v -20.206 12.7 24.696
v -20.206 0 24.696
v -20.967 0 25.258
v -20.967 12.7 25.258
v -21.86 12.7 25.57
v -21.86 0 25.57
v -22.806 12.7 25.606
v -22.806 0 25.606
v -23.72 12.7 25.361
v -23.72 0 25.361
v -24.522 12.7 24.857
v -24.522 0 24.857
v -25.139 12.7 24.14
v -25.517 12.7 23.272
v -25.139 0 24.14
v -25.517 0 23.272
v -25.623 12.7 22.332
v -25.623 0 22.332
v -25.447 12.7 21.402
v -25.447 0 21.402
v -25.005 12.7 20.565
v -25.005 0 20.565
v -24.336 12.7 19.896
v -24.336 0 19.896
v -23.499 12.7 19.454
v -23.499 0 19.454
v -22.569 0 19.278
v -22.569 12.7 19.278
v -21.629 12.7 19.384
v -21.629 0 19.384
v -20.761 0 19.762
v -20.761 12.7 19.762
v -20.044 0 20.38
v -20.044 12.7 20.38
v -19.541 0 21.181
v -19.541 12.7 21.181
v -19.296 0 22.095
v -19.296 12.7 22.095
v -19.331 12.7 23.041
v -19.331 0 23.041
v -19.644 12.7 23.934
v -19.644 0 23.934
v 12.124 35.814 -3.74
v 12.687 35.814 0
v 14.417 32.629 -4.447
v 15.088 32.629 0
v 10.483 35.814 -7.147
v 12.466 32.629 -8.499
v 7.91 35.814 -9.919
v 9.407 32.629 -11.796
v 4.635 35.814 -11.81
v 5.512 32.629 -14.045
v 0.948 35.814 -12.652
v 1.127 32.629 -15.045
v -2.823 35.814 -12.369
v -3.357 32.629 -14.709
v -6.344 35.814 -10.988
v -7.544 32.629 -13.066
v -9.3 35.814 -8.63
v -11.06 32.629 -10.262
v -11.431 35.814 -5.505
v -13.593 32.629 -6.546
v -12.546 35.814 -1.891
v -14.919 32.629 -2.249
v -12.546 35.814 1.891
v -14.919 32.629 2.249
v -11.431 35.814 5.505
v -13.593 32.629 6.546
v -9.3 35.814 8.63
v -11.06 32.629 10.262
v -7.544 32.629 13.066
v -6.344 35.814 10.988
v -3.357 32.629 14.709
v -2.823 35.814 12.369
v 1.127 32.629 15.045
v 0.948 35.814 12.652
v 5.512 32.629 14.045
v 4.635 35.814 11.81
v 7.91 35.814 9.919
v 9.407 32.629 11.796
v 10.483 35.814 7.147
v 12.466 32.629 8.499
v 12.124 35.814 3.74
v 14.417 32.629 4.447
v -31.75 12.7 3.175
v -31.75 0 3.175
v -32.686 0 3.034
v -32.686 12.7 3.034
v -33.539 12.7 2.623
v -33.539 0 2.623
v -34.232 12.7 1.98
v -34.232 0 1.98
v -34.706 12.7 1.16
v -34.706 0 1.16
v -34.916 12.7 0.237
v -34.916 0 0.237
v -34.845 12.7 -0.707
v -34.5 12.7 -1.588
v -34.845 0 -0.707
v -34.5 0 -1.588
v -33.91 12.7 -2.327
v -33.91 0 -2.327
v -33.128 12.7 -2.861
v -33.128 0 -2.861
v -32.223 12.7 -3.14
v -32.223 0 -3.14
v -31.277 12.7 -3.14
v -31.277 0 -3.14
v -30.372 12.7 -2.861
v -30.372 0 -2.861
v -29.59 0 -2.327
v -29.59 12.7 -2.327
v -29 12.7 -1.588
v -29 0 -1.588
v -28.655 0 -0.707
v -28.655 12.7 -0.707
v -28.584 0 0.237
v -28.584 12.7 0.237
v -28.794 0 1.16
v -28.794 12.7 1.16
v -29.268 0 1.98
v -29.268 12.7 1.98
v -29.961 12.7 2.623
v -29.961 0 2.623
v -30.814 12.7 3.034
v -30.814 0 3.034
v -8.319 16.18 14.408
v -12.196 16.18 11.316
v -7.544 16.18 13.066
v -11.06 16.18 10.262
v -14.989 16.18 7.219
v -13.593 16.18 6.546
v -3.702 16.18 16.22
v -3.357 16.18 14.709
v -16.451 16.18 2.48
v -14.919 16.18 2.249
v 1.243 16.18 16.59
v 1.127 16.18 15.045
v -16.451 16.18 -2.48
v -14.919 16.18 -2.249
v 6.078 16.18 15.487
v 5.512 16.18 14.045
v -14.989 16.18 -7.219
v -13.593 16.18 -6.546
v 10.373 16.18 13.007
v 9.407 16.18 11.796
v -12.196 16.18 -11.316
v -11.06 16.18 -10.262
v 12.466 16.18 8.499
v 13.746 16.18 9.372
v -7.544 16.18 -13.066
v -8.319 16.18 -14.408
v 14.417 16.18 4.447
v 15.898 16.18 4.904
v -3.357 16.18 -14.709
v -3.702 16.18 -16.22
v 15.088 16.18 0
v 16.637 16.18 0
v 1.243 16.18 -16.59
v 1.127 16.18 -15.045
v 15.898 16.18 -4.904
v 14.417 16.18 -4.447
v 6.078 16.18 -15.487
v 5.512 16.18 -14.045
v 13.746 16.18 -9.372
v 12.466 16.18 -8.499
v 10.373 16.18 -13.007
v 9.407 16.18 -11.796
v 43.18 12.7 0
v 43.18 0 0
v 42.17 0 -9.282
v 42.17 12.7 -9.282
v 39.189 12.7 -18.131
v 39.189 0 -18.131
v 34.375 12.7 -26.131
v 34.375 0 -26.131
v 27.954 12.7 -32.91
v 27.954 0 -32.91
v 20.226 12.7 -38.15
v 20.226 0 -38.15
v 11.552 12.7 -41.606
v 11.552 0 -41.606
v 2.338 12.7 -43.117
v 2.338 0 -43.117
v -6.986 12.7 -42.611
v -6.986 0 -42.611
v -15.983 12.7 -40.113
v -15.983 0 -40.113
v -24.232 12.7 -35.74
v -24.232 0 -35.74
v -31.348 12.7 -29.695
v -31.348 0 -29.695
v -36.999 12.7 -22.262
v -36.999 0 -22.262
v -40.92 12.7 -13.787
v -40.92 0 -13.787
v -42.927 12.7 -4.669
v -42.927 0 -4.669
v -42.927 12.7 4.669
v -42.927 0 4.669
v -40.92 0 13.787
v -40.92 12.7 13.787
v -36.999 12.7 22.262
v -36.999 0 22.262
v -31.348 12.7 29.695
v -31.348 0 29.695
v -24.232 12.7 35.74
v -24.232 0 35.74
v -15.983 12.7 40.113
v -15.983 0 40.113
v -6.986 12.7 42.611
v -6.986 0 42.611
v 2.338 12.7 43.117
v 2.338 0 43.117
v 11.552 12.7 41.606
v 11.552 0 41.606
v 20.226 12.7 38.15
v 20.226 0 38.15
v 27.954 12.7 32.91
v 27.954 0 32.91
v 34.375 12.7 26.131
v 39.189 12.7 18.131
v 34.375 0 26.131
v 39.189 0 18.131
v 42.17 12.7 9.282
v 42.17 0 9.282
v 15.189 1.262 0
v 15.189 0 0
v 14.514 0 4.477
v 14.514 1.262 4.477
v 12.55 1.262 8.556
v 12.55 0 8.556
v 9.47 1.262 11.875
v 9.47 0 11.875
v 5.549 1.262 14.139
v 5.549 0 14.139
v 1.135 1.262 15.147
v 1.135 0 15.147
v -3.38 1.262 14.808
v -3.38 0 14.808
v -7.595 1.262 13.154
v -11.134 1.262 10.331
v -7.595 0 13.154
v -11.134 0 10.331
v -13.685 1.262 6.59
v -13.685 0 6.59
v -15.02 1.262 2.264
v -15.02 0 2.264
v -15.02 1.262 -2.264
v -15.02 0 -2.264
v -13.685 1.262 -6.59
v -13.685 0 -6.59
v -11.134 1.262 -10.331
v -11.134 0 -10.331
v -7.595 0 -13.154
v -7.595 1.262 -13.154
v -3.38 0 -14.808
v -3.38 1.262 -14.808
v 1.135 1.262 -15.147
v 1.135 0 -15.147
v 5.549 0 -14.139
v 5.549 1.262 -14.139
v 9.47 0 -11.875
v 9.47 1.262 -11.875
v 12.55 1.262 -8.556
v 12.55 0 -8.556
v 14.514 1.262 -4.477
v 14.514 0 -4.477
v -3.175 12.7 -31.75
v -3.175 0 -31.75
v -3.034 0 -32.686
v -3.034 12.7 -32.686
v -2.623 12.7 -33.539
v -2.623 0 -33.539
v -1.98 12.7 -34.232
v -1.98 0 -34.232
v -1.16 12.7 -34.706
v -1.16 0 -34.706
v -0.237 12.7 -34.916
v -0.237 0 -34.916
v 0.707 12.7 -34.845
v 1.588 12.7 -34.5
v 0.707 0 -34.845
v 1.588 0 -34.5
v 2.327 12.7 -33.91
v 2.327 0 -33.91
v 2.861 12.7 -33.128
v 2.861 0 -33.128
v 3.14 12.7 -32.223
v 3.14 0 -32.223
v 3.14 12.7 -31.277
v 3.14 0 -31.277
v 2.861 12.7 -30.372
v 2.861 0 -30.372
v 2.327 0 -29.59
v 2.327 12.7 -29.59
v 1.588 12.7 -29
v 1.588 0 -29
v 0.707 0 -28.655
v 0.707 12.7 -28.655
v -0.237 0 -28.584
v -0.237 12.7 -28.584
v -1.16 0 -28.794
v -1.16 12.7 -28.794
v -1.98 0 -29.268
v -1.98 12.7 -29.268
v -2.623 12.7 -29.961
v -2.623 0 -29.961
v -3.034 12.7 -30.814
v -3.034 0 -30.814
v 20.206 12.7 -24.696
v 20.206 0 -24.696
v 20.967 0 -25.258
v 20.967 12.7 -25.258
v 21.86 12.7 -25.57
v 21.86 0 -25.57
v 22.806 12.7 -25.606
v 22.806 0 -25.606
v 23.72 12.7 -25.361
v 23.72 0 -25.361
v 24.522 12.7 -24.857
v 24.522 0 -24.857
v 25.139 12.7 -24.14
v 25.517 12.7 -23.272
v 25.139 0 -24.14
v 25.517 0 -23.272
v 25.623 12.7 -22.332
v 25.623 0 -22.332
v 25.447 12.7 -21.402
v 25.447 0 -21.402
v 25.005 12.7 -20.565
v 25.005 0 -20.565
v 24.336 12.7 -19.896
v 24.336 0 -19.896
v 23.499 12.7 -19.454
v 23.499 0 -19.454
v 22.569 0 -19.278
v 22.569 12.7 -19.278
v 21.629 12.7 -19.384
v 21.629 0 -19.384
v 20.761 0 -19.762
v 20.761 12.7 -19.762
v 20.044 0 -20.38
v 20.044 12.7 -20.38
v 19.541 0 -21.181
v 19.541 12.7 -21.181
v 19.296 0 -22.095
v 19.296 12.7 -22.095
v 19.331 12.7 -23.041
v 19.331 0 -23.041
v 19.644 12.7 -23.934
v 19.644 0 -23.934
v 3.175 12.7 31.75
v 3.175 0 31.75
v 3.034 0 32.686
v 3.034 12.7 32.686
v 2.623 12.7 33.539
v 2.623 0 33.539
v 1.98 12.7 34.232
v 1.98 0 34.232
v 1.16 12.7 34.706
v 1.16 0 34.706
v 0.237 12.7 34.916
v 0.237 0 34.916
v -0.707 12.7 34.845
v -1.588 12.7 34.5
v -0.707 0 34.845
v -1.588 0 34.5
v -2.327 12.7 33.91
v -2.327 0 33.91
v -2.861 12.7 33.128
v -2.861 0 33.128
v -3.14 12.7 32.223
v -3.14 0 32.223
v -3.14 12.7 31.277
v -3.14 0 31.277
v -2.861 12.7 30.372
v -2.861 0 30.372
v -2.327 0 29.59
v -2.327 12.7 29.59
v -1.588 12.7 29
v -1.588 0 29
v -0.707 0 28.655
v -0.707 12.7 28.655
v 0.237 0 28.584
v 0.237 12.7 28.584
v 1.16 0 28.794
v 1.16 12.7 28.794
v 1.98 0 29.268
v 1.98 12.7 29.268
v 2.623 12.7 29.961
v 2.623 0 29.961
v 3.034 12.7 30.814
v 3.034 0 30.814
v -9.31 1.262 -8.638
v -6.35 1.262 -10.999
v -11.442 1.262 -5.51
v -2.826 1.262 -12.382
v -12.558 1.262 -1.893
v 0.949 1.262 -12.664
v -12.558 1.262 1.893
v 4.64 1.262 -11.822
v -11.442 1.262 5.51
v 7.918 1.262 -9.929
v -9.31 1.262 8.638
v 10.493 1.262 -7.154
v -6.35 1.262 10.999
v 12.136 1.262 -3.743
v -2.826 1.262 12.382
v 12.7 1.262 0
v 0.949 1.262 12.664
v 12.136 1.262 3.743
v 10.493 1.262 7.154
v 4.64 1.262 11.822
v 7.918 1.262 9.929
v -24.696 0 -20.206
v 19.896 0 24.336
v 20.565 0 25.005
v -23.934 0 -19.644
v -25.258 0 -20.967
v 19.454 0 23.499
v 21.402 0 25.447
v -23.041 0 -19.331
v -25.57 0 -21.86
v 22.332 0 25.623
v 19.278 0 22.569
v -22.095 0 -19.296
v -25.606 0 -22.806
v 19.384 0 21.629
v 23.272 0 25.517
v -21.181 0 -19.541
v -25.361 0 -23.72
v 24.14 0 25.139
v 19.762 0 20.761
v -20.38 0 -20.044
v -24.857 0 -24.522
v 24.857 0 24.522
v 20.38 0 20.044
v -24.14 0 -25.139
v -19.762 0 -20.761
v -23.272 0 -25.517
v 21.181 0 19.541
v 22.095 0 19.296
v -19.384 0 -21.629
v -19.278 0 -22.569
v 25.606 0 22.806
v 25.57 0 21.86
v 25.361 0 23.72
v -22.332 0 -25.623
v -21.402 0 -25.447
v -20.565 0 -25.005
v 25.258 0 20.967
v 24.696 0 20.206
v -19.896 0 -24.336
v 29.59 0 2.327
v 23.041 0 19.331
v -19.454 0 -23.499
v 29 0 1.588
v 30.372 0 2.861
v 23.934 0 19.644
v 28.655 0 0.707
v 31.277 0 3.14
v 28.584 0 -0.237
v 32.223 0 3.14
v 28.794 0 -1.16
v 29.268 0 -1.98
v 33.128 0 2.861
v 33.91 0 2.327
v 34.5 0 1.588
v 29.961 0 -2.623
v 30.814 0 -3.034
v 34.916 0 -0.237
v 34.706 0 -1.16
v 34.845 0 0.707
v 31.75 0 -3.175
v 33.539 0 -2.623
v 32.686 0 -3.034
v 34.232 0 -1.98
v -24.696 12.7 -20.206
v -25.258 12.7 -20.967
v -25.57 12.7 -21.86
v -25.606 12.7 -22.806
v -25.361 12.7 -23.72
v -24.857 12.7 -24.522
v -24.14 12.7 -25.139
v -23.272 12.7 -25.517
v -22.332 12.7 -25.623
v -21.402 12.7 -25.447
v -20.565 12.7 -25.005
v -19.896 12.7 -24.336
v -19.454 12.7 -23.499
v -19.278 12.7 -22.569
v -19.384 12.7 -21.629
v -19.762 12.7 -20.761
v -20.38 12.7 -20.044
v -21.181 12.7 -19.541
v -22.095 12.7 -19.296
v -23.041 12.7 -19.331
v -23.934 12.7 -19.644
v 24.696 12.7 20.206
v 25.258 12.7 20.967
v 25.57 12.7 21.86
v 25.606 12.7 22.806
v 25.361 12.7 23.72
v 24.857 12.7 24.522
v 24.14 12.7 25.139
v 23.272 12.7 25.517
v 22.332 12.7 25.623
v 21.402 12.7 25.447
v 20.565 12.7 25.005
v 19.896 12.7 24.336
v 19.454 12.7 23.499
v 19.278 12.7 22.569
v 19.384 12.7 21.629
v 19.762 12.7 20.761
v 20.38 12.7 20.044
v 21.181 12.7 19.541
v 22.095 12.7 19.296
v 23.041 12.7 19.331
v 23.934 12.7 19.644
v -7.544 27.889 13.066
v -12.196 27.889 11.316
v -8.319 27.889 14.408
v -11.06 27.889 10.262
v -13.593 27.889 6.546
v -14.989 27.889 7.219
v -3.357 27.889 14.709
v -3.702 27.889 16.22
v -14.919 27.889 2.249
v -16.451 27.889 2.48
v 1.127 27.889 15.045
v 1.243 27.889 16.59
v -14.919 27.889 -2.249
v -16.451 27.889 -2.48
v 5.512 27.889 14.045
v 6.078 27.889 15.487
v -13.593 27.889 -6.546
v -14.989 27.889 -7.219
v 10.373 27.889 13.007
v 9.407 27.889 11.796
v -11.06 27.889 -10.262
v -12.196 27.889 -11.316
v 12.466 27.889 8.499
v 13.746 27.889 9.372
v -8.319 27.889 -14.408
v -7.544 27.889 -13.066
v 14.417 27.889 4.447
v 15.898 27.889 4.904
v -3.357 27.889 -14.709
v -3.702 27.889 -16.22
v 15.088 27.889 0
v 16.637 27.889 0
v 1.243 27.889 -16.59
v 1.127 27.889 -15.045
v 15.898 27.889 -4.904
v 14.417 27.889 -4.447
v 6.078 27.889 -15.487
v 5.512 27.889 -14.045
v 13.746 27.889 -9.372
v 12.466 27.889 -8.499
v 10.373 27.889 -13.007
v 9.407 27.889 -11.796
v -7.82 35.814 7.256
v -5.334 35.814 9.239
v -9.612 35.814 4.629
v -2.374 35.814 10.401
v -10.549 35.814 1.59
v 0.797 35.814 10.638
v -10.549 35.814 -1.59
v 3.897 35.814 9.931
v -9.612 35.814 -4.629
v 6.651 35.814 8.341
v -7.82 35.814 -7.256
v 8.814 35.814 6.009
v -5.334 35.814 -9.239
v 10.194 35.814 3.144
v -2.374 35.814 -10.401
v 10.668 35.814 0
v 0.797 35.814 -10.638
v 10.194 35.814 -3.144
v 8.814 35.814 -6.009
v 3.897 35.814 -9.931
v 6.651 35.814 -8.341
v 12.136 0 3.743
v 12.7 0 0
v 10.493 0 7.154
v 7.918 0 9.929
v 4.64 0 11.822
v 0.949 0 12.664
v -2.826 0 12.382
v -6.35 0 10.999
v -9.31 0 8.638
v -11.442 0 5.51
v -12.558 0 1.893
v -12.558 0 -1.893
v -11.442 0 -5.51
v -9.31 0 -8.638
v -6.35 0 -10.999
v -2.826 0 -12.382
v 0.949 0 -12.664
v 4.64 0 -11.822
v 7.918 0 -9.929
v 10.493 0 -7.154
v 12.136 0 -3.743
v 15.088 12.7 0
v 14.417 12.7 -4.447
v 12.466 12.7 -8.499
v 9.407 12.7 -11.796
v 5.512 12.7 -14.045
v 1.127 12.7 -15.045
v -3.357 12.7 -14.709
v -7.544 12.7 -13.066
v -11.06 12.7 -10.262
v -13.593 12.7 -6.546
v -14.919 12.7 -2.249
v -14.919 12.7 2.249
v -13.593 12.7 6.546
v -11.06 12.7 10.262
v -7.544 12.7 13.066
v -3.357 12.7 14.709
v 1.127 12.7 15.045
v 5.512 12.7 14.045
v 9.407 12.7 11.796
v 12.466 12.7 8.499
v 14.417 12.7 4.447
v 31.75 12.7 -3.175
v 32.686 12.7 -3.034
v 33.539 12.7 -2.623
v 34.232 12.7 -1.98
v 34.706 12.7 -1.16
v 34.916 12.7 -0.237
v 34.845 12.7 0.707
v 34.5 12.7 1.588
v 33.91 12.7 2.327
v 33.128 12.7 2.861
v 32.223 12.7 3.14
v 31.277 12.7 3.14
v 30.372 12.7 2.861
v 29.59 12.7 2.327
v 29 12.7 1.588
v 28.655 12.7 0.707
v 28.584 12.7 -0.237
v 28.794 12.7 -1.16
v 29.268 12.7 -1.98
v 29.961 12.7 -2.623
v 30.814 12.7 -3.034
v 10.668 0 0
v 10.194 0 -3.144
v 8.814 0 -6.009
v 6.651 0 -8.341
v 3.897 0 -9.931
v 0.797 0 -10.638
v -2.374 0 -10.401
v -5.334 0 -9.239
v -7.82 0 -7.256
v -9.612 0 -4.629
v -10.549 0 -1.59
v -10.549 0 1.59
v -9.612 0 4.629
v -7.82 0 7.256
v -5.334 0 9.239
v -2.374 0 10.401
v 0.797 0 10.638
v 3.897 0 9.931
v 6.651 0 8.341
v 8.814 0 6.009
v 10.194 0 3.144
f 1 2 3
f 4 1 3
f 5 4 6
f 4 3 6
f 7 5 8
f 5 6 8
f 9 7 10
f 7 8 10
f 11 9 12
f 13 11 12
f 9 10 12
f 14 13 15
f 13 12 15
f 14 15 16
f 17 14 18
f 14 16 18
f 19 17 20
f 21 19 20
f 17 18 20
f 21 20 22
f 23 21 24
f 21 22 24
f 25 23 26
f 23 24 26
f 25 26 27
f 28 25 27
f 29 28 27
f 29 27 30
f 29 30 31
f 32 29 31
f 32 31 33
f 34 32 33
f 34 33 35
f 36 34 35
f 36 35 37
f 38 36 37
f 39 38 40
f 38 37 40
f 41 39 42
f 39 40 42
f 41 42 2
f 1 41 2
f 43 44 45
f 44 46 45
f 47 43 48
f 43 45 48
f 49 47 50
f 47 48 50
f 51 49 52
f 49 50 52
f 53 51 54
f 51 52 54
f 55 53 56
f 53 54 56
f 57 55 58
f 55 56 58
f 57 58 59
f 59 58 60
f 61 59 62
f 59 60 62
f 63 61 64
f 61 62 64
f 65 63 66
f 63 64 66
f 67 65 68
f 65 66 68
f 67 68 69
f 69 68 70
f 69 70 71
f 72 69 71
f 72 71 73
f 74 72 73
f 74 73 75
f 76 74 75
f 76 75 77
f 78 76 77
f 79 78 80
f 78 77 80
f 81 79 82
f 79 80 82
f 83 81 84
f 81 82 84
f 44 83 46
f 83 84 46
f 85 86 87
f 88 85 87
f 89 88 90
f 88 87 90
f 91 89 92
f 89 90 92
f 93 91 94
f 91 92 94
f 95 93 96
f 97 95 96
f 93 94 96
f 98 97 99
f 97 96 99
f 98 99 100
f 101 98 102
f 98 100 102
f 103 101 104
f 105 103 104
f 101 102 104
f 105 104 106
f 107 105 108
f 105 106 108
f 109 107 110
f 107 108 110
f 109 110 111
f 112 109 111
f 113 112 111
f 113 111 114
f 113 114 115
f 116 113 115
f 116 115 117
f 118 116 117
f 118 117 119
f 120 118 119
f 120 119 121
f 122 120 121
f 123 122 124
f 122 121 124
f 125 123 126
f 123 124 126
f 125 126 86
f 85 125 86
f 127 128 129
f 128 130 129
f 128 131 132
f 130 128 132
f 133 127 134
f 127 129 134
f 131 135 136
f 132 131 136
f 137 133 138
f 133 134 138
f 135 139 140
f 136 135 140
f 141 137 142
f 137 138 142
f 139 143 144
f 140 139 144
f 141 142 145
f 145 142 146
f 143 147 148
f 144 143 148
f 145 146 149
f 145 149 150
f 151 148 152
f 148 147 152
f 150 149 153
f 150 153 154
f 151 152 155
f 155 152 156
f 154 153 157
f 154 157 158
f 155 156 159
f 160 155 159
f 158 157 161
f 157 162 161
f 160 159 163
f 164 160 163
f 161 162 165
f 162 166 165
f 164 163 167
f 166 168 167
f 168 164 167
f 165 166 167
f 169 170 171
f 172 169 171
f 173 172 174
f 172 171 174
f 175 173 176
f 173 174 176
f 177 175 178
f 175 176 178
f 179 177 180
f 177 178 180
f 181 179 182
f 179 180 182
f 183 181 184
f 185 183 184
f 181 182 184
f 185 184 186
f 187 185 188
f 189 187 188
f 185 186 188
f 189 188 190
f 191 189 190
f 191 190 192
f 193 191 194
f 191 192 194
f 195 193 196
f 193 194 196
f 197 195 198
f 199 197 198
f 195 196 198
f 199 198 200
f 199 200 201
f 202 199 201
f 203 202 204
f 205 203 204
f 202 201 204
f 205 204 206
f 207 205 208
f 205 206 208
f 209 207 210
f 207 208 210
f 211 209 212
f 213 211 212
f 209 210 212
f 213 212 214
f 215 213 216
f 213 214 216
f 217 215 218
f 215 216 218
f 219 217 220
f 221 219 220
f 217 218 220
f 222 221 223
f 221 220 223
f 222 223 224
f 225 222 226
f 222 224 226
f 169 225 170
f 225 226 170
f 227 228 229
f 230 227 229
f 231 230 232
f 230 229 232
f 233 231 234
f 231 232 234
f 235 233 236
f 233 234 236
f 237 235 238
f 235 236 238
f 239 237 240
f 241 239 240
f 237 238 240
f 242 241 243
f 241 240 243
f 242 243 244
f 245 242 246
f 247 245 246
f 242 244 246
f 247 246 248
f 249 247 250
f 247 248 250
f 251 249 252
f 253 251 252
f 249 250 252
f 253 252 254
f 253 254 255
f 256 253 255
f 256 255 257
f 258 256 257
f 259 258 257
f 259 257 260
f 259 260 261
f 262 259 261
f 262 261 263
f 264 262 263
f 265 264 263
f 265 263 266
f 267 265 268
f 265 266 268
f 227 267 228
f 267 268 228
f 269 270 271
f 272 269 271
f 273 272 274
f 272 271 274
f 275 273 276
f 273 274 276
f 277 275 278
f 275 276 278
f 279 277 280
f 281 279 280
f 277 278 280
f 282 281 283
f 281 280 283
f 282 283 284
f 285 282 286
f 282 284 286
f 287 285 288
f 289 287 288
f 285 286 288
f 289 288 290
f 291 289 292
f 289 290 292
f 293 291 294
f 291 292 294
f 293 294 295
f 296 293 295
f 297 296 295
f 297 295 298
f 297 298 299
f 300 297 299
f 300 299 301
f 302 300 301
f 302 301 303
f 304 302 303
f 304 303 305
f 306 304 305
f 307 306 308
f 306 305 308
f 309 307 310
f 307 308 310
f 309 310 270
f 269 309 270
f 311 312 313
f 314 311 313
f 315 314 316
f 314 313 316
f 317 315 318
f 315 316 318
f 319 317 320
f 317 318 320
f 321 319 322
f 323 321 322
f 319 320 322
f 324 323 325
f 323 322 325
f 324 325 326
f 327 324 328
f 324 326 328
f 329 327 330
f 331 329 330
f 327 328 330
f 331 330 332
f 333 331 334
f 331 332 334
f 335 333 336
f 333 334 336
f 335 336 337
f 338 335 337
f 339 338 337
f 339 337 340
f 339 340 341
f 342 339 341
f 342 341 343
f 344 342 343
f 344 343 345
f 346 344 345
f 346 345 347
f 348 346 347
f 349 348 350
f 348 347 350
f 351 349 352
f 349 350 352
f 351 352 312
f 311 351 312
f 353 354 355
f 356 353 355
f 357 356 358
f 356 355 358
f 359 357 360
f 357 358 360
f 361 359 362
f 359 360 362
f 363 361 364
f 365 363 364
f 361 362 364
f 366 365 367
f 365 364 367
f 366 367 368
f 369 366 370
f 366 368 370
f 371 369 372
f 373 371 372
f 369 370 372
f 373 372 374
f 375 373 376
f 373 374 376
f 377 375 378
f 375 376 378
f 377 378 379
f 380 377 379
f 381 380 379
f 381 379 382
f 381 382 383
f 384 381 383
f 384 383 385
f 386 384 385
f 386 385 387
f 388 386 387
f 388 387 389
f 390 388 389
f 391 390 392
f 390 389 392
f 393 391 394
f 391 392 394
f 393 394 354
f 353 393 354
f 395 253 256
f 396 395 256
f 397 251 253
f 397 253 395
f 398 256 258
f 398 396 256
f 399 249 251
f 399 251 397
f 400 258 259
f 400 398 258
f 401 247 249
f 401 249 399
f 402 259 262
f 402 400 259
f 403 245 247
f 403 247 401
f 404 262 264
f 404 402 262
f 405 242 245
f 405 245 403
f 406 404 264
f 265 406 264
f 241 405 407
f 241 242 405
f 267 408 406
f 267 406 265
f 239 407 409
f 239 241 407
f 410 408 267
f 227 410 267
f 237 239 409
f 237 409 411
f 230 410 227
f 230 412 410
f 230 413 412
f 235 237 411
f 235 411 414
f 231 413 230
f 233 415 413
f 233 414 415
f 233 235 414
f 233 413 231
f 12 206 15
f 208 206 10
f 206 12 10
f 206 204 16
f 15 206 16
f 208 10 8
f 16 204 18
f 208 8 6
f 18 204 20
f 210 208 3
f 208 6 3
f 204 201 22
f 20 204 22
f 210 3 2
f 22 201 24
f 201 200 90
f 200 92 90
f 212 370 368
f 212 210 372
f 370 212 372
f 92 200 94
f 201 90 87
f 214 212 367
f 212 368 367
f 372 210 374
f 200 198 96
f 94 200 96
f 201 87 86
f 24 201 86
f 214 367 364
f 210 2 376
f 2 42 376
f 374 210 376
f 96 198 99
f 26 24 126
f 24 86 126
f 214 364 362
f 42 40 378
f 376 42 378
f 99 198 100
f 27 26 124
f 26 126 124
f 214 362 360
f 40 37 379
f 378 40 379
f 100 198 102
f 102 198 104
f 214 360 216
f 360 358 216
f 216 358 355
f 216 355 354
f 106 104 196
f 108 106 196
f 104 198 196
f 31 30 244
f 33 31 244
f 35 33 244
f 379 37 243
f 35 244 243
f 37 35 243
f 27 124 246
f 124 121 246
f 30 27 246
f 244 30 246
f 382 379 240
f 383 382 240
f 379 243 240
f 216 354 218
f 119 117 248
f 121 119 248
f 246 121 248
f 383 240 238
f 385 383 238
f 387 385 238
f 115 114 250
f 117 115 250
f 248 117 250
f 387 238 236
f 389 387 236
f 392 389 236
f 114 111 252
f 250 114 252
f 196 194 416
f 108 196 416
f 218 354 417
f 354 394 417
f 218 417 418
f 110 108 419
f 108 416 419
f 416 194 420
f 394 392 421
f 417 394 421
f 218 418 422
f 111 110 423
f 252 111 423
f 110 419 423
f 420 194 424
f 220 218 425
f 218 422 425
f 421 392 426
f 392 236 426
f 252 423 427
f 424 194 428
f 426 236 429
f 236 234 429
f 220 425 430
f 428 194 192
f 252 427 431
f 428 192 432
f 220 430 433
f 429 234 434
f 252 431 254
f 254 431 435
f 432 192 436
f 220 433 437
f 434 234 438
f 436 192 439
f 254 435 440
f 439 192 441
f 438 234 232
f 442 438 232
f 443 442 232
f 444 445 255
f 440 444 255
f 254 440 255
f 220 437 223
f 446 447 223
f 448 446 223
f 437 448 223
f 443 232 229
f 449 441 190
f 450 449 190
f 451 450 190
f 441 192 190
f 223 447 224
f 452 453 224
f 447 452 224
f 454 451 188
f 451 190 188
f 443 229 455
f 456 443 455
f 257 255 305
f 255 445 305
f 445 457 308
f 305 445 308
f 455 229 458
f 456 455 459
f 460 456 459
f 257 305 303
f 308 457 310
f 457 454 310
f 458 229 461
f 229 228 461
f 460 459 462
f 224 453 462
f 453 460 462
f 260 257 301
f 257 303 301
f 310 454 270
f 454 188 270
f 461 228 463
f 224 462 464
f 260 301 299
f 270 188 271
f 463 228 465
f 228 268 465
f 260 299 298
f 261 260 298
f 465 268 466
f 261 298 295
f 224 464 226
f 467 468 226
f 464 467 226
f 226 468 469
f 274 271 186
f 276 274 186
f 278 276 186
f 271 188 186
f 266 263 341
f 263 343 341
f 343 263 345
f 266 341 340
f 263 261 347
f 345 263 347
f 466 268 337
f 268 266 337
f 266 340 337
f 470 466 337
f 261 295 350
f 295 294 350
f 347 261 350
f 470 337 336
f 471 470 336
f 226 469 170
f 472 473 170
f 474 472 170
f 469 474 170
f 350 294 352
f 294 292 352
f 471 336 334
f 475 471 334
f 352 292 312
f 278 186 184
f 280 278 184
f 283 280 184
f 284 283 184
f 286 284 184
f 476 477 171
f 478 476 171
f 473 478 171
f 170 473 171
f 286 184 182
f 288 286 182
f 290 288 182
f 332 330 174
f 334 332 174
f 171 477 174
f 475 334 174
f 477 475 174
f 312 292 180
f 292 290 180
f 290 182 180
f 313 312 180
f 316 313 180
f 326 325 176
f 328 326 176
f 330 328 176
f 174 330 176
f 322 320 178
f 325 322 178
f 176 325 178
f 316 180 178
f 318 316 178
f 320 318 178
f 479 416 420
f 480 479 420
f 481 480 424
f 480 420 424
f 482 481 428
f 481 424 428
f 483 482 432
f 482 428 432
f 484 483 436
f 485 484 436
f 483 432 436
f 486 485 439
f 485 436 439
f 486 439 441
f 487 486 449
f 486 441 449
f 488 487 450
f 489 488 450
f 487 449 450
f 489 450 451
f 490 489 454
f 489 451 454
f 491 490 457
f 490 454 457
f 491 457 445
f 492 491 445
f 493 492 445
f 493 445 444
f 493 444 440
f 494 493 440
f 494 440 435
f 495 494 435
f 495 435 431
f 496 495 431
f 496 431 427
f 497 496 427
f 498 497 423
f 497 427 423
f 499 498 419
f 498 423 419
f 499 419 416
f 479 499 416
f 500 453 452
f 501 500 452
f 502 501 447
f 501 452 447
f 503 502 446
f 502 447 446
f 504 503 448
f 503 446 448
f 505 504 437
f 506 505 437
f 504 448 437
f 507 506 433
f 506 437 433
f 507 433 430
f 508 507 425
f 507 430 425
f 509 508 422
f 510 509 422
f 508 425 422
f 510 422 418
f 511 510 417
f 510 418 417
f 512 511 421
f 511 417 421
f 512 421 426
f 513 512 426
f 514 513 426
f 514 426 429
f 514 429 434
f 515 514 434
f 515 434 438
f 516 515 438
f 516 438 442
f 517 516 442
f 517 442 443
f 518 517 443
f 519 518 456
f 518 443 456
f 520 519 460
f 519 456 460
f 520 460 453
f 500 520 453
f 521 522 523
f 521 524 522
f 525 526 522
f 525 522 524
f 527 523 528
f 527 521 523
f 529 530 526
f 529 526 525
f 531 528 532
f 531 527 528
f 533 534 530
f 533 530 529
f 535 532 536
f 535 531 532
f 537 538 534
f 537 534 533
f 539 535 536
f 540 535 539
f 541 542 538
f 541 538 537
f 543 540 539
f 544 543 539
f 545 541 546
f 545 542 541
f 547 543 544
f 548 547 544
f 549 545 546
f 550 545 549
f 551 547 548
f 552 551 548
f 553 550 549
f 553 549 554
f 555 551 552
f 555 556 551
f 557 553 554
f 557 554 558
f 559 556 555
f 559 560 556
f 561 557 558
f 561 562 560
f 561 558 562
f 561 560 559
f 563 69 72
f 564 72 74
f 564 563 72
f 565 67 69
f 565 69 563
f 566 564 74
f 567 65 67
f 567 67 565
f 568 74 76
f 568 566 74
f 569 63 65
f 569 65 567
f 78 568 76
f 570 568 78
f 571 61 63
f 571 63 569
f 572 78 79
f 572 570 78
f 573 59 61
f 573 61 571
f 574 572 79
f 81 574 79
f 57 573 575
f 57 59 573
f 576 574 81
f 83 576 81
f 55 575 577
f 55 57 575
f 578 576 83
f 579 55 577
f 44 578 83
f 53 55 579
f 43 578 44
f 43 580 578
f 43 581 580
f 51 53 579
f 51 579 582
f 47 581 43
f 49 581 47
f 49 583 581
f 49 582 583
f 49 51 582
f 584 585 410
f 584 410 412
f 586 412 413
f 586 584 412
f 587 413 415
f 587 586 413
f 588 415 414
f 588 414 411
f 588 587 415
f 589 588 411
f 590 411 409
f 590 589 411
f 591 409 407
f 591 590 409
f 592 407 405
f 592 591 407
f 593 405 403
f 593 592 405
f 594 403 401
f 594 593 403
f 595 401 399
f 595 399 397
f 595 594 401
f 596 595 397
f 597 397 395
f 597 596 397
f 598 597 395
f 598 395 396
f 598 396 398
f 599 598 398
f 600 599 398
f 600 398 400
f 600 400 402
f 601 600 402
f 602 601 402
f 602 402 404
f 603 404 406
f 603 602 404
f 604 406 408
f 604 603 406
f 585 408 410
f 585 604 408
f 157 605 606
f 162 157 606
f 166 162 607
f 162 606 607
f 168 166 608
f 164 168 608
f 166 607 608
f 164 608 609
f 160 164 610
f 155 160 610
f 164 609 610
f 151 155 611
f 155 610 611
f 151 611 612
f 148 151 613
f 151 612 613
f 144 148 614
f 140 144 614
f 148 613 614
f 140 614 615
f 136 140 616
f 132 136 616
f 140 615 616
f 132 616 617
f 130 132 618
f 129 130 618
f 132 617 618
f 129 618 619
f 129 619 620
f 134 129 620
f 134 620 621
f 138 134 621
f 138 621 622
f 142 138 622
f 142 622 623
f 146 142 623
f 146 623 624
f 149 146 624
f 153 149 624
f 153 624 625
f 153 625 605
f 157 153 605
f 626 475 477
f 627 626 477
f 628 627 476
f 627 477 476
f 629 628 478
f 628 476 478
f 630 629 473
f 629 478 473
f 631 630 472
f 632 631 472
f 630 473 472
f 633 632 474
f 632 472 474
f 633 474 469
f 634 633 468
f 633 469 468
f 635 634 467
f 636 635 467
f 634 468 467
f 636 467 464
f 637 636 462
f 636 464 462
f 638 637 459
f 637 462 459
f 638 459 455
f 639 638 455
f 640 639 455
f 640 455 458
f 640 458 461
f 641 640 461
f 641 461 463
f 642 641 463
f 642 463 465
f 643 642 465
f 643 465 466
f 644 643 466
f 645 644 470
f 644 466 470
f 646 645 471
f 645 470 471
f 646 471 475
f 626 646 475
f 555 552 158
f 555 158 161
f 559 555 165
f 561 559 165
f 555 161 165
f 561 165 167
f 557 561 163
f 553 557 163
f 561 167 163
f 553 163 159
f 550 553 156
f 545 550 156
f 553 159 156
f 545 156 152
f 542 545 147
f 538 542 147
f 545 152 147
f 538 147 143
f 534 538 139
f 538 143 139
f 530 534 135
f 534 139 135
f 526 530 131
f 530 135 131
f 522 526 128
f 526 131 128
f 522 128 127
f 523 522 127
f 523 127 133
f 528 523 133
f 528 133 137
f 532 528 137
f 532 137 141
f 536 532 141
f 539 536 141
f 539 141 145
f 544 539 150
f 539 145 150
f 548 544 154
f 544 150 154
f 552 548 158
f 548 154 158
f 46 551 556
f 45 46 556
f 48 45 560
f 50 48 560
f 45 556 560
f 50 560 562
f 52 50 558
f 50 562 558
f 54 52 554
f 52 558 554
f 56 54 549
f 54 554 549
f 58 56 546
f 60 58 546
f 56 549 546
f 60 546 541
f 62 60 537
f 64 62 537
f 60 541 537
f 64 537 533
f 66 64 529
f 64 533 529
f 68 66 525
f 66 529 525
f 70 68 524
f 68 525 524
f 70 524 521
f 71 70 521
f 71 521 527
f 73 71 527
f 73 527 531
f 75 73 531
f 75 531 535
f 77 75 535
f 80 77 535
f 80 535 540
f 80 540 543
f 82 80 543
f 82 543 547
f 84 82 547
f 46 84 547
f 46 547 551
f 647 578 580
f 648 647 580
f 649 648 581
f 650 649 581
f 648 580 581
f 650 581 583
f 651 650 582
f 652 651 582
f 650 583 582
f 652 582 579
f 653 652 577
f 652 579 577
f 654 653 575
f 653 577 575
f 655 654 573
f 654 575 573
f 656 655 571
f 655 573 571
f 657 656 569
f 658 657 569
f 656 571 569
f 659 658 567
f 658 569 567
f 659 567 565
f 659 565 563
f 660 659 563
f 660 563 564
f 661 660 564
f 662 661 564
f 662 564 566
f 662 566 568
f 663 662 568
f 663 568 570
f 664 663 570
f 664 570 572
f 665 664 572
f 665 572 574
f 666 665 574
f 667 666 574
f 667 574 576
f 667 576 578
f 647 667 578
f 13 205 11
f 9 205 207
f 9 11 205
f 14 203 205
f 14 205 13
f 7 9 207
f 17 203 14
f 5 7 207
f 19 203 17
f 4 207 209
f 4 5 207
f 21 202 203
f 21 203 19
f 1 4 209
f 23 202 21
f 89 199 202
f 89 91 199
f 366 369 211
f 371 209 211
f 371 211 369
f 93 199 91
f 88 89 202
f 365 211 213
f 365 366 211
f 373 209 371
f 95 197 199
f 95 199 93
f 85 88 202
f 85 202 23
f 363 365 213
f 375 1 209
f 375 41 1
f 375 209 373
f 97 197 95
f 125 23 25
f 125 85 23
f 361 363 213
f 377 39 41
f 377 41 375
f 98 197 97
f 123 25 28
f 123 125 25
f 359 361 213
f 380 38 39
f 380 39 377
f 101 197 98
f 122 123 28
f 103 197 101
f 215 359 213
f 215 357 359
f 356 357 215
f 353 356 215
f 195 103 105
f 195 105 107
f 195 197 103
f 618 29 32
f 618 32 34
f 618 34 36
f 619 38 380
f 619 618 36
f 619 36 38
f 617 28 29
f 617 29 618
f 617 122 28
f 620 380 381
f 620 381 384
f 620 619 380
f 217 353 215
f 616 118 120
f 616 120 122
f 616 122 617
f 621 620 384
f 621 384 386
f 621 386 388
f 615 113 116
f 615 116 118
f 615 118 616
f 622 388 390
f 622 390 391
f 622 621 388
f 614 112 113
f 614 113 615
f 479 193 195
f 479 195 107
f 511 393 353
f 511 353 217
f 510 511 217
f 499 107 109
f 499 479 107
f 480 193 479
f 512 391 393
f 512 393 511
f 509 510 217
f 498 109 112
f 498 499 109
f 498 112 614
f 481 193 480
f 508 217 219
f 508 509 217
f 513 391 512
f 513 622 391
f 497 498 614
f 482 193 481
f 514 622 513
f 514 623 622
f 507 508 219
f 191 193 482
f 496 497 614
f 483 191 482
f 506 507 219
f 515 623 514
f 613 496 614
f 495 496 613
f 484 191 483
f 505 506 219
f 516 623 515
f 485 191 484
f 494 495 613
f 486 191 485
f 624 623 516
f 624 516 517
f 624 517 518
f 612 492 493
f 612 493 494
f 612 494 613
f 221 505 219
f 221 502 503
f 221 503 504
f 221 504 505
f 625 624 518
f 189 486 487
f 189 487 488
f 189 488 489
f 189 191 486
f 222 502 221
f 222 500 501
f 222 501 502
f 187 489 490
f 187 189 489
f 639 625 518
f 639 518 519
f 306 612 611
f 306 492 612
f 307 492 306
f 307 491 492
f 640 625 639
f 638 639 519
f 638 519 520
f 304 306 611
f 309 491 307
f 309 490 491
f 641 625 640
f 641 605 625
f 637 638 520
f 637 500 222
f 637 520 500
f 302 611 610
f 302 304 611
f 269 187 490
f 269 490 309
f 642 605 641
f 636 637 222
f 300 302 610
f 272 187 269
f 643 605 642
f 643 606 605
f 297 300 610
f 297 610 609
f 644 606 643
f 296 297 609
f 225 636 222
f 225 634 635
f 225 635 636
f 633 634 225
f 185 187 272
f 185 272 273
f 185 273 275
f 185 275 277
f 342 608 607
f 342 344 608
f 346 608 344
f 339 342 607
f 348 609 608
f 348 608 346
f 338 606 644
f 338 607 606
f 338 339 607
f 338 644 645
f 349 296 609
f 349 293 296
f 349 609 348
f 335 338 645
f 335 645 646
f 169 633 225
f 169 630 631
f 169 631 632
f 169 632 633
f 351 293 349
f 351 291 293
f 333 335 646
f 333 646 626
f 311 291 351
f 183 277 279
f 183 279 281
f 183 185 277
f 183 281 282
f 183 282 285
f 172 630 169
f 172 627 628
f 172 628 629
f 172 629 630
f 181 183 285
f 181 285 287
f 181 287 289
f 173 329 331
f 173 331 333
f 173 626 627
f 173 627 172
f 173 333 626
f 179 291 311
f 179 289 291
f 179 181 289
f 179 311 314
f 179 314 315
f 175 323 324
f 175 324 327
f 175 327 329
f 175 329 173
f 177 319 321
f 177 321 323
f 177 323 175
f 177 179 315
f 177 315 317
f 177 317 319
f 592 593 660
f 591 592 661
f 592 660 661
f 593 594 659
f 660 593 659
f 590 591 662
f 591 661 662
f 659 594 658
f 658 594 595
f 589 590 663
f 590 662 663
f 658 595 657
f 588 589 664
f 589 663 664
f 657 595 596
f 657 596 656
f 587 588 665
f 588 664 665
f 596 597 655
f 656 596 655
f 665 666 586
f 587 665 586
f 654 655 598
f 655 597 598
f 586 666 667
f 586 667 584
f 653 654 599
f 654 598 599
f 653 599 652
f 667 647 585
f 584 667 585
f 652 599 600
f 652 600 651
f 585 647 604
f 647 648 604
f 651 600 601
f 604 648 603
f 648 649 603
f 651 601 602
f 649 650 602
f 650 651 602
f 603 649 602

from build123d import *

# Parameters (mm, degrees)
SKETCH1_R              = 43.18
FLANGE_EXTRUDE_DEPTH   = 12.7
SKETCH2_R              = 15.0876
AN_FITTING_BODY_DEPTH  = 23.114
HOLE_FOR_FITTING_REACH = 37.814
SKETCH3_R              = 10.668
SKETCH5_R              = 16.637
SKETCH5_R_2            = 15.0876
MEAT_FOR_THREAD_DEPTH  = 11.7094
SKETCH10_R             = 15.1892
SKETCH10_R_2           = 12.7
O_RING_GROOVE_DEPTH    = 1.26238
SKETCH13_R             = 3.175
BOLT_HOLE_DEPTH        = 12.7
CIRPATTERN1_COUNT      = 8


with BuildPart() as part:
    # Sketch1 → flange extrude (new body)
    with BuildSketch(Plane(origin=(0, 0, 0), x_dir=(1, 0, 0), z_dir=(0, 1, 0))):
        Circle(SKETCH1_R)
    extrude(amount=FLANGE_EXTRUDE_DEPTH)

    # Sketch2 → an fitting body (add)
    with BuildSketch(Plane(origin=(0, 12.7, 0), x_dir=(1, 0, 0), z_dir=(0, 1, 0))):
        Circle(SKETCH2_R)
    extrude(amount=AN_FITTING_BODY_DEPTH)

    # Sketch3 → hole for fitting (cut, up to next)
    with BuildSketch(Plane(origin=(0, 35.814, 0), x_dir=(1, 0, 0), z_dir=(0, 1, 0)), mode=Mode.PRIVATE) as hole_for_fitting_sk1:
        Circle(SKETCH3_R)
    hole_for_fitting_tool1 = extrude(hole_for_fitting_sk1.sketch, amount=-HOLE_FOR_FITTING_REACH, mode=Mode.PRIVATE) & part.part
    add(hole_for_fitting_tool1.solids().sort_by_distance((0, 35.814, 0))[0], mode=Mode.SUBTRACT)

    # Sketch5 → meat for thread (add)
    with BuildSketch(Plane(origin=(0, 16.1798, 0), x_dir=(1, 0, 0), z_dir=(0, 1, 0))):
        Circle(SKETCH5_R)
        Circle(SKETCH5_R_2, mode=Mode.SUBTRACT)
    extrude(amount=MEAT_FOR_THREAD_DEPTH)

    # Sketch6 → Cut-Revolve1 (revolve, cut)
    with BuildSketch(Plane.XY):
        Polygon((12.6873, 35.814), (15.0876, 32.628694315), (15.0876, 35.814), align=None)
    revolve(axis=Axis((0, 0, 0), (0, 1, 0)), mode=Mode.SUBTRACT)

    # Sketch10 → O-ring groove (cut)
    with BuildSketch(Plane.XZ):
        Circle(SKETCH10_R)
        Circle(SKETCH10_R_2, mode=Mode.SUBTRACT)
    extrude(amount=-O_RING_GROOVE_DEPTH, mode=Mode.SUBTRACT)

    # Sketch13 → bolt hole (cut)
    with BuildSketch(Plane.XZ):
        with Locations((0, 31.75)):
            Circle(SKETCH13_R)
    bolt_hole = extrude(amount=-BOLT_HOLE_DEPTH, mode=Mode.SUBTRACT)

    # CirPattern1: bolt hole ×8 about axis
    cirpattern1_axis = Axis((0, 0, 0), (0, 1, 0))
    for i in range(1, CIRPATTERN1_COUNT):
        add(bolt_hole.rotate(cirpattern1_axis, i * 360 / CIRPATTERN1_COUNT), mode=Mode.SUBTRACT)


solid = part.part
